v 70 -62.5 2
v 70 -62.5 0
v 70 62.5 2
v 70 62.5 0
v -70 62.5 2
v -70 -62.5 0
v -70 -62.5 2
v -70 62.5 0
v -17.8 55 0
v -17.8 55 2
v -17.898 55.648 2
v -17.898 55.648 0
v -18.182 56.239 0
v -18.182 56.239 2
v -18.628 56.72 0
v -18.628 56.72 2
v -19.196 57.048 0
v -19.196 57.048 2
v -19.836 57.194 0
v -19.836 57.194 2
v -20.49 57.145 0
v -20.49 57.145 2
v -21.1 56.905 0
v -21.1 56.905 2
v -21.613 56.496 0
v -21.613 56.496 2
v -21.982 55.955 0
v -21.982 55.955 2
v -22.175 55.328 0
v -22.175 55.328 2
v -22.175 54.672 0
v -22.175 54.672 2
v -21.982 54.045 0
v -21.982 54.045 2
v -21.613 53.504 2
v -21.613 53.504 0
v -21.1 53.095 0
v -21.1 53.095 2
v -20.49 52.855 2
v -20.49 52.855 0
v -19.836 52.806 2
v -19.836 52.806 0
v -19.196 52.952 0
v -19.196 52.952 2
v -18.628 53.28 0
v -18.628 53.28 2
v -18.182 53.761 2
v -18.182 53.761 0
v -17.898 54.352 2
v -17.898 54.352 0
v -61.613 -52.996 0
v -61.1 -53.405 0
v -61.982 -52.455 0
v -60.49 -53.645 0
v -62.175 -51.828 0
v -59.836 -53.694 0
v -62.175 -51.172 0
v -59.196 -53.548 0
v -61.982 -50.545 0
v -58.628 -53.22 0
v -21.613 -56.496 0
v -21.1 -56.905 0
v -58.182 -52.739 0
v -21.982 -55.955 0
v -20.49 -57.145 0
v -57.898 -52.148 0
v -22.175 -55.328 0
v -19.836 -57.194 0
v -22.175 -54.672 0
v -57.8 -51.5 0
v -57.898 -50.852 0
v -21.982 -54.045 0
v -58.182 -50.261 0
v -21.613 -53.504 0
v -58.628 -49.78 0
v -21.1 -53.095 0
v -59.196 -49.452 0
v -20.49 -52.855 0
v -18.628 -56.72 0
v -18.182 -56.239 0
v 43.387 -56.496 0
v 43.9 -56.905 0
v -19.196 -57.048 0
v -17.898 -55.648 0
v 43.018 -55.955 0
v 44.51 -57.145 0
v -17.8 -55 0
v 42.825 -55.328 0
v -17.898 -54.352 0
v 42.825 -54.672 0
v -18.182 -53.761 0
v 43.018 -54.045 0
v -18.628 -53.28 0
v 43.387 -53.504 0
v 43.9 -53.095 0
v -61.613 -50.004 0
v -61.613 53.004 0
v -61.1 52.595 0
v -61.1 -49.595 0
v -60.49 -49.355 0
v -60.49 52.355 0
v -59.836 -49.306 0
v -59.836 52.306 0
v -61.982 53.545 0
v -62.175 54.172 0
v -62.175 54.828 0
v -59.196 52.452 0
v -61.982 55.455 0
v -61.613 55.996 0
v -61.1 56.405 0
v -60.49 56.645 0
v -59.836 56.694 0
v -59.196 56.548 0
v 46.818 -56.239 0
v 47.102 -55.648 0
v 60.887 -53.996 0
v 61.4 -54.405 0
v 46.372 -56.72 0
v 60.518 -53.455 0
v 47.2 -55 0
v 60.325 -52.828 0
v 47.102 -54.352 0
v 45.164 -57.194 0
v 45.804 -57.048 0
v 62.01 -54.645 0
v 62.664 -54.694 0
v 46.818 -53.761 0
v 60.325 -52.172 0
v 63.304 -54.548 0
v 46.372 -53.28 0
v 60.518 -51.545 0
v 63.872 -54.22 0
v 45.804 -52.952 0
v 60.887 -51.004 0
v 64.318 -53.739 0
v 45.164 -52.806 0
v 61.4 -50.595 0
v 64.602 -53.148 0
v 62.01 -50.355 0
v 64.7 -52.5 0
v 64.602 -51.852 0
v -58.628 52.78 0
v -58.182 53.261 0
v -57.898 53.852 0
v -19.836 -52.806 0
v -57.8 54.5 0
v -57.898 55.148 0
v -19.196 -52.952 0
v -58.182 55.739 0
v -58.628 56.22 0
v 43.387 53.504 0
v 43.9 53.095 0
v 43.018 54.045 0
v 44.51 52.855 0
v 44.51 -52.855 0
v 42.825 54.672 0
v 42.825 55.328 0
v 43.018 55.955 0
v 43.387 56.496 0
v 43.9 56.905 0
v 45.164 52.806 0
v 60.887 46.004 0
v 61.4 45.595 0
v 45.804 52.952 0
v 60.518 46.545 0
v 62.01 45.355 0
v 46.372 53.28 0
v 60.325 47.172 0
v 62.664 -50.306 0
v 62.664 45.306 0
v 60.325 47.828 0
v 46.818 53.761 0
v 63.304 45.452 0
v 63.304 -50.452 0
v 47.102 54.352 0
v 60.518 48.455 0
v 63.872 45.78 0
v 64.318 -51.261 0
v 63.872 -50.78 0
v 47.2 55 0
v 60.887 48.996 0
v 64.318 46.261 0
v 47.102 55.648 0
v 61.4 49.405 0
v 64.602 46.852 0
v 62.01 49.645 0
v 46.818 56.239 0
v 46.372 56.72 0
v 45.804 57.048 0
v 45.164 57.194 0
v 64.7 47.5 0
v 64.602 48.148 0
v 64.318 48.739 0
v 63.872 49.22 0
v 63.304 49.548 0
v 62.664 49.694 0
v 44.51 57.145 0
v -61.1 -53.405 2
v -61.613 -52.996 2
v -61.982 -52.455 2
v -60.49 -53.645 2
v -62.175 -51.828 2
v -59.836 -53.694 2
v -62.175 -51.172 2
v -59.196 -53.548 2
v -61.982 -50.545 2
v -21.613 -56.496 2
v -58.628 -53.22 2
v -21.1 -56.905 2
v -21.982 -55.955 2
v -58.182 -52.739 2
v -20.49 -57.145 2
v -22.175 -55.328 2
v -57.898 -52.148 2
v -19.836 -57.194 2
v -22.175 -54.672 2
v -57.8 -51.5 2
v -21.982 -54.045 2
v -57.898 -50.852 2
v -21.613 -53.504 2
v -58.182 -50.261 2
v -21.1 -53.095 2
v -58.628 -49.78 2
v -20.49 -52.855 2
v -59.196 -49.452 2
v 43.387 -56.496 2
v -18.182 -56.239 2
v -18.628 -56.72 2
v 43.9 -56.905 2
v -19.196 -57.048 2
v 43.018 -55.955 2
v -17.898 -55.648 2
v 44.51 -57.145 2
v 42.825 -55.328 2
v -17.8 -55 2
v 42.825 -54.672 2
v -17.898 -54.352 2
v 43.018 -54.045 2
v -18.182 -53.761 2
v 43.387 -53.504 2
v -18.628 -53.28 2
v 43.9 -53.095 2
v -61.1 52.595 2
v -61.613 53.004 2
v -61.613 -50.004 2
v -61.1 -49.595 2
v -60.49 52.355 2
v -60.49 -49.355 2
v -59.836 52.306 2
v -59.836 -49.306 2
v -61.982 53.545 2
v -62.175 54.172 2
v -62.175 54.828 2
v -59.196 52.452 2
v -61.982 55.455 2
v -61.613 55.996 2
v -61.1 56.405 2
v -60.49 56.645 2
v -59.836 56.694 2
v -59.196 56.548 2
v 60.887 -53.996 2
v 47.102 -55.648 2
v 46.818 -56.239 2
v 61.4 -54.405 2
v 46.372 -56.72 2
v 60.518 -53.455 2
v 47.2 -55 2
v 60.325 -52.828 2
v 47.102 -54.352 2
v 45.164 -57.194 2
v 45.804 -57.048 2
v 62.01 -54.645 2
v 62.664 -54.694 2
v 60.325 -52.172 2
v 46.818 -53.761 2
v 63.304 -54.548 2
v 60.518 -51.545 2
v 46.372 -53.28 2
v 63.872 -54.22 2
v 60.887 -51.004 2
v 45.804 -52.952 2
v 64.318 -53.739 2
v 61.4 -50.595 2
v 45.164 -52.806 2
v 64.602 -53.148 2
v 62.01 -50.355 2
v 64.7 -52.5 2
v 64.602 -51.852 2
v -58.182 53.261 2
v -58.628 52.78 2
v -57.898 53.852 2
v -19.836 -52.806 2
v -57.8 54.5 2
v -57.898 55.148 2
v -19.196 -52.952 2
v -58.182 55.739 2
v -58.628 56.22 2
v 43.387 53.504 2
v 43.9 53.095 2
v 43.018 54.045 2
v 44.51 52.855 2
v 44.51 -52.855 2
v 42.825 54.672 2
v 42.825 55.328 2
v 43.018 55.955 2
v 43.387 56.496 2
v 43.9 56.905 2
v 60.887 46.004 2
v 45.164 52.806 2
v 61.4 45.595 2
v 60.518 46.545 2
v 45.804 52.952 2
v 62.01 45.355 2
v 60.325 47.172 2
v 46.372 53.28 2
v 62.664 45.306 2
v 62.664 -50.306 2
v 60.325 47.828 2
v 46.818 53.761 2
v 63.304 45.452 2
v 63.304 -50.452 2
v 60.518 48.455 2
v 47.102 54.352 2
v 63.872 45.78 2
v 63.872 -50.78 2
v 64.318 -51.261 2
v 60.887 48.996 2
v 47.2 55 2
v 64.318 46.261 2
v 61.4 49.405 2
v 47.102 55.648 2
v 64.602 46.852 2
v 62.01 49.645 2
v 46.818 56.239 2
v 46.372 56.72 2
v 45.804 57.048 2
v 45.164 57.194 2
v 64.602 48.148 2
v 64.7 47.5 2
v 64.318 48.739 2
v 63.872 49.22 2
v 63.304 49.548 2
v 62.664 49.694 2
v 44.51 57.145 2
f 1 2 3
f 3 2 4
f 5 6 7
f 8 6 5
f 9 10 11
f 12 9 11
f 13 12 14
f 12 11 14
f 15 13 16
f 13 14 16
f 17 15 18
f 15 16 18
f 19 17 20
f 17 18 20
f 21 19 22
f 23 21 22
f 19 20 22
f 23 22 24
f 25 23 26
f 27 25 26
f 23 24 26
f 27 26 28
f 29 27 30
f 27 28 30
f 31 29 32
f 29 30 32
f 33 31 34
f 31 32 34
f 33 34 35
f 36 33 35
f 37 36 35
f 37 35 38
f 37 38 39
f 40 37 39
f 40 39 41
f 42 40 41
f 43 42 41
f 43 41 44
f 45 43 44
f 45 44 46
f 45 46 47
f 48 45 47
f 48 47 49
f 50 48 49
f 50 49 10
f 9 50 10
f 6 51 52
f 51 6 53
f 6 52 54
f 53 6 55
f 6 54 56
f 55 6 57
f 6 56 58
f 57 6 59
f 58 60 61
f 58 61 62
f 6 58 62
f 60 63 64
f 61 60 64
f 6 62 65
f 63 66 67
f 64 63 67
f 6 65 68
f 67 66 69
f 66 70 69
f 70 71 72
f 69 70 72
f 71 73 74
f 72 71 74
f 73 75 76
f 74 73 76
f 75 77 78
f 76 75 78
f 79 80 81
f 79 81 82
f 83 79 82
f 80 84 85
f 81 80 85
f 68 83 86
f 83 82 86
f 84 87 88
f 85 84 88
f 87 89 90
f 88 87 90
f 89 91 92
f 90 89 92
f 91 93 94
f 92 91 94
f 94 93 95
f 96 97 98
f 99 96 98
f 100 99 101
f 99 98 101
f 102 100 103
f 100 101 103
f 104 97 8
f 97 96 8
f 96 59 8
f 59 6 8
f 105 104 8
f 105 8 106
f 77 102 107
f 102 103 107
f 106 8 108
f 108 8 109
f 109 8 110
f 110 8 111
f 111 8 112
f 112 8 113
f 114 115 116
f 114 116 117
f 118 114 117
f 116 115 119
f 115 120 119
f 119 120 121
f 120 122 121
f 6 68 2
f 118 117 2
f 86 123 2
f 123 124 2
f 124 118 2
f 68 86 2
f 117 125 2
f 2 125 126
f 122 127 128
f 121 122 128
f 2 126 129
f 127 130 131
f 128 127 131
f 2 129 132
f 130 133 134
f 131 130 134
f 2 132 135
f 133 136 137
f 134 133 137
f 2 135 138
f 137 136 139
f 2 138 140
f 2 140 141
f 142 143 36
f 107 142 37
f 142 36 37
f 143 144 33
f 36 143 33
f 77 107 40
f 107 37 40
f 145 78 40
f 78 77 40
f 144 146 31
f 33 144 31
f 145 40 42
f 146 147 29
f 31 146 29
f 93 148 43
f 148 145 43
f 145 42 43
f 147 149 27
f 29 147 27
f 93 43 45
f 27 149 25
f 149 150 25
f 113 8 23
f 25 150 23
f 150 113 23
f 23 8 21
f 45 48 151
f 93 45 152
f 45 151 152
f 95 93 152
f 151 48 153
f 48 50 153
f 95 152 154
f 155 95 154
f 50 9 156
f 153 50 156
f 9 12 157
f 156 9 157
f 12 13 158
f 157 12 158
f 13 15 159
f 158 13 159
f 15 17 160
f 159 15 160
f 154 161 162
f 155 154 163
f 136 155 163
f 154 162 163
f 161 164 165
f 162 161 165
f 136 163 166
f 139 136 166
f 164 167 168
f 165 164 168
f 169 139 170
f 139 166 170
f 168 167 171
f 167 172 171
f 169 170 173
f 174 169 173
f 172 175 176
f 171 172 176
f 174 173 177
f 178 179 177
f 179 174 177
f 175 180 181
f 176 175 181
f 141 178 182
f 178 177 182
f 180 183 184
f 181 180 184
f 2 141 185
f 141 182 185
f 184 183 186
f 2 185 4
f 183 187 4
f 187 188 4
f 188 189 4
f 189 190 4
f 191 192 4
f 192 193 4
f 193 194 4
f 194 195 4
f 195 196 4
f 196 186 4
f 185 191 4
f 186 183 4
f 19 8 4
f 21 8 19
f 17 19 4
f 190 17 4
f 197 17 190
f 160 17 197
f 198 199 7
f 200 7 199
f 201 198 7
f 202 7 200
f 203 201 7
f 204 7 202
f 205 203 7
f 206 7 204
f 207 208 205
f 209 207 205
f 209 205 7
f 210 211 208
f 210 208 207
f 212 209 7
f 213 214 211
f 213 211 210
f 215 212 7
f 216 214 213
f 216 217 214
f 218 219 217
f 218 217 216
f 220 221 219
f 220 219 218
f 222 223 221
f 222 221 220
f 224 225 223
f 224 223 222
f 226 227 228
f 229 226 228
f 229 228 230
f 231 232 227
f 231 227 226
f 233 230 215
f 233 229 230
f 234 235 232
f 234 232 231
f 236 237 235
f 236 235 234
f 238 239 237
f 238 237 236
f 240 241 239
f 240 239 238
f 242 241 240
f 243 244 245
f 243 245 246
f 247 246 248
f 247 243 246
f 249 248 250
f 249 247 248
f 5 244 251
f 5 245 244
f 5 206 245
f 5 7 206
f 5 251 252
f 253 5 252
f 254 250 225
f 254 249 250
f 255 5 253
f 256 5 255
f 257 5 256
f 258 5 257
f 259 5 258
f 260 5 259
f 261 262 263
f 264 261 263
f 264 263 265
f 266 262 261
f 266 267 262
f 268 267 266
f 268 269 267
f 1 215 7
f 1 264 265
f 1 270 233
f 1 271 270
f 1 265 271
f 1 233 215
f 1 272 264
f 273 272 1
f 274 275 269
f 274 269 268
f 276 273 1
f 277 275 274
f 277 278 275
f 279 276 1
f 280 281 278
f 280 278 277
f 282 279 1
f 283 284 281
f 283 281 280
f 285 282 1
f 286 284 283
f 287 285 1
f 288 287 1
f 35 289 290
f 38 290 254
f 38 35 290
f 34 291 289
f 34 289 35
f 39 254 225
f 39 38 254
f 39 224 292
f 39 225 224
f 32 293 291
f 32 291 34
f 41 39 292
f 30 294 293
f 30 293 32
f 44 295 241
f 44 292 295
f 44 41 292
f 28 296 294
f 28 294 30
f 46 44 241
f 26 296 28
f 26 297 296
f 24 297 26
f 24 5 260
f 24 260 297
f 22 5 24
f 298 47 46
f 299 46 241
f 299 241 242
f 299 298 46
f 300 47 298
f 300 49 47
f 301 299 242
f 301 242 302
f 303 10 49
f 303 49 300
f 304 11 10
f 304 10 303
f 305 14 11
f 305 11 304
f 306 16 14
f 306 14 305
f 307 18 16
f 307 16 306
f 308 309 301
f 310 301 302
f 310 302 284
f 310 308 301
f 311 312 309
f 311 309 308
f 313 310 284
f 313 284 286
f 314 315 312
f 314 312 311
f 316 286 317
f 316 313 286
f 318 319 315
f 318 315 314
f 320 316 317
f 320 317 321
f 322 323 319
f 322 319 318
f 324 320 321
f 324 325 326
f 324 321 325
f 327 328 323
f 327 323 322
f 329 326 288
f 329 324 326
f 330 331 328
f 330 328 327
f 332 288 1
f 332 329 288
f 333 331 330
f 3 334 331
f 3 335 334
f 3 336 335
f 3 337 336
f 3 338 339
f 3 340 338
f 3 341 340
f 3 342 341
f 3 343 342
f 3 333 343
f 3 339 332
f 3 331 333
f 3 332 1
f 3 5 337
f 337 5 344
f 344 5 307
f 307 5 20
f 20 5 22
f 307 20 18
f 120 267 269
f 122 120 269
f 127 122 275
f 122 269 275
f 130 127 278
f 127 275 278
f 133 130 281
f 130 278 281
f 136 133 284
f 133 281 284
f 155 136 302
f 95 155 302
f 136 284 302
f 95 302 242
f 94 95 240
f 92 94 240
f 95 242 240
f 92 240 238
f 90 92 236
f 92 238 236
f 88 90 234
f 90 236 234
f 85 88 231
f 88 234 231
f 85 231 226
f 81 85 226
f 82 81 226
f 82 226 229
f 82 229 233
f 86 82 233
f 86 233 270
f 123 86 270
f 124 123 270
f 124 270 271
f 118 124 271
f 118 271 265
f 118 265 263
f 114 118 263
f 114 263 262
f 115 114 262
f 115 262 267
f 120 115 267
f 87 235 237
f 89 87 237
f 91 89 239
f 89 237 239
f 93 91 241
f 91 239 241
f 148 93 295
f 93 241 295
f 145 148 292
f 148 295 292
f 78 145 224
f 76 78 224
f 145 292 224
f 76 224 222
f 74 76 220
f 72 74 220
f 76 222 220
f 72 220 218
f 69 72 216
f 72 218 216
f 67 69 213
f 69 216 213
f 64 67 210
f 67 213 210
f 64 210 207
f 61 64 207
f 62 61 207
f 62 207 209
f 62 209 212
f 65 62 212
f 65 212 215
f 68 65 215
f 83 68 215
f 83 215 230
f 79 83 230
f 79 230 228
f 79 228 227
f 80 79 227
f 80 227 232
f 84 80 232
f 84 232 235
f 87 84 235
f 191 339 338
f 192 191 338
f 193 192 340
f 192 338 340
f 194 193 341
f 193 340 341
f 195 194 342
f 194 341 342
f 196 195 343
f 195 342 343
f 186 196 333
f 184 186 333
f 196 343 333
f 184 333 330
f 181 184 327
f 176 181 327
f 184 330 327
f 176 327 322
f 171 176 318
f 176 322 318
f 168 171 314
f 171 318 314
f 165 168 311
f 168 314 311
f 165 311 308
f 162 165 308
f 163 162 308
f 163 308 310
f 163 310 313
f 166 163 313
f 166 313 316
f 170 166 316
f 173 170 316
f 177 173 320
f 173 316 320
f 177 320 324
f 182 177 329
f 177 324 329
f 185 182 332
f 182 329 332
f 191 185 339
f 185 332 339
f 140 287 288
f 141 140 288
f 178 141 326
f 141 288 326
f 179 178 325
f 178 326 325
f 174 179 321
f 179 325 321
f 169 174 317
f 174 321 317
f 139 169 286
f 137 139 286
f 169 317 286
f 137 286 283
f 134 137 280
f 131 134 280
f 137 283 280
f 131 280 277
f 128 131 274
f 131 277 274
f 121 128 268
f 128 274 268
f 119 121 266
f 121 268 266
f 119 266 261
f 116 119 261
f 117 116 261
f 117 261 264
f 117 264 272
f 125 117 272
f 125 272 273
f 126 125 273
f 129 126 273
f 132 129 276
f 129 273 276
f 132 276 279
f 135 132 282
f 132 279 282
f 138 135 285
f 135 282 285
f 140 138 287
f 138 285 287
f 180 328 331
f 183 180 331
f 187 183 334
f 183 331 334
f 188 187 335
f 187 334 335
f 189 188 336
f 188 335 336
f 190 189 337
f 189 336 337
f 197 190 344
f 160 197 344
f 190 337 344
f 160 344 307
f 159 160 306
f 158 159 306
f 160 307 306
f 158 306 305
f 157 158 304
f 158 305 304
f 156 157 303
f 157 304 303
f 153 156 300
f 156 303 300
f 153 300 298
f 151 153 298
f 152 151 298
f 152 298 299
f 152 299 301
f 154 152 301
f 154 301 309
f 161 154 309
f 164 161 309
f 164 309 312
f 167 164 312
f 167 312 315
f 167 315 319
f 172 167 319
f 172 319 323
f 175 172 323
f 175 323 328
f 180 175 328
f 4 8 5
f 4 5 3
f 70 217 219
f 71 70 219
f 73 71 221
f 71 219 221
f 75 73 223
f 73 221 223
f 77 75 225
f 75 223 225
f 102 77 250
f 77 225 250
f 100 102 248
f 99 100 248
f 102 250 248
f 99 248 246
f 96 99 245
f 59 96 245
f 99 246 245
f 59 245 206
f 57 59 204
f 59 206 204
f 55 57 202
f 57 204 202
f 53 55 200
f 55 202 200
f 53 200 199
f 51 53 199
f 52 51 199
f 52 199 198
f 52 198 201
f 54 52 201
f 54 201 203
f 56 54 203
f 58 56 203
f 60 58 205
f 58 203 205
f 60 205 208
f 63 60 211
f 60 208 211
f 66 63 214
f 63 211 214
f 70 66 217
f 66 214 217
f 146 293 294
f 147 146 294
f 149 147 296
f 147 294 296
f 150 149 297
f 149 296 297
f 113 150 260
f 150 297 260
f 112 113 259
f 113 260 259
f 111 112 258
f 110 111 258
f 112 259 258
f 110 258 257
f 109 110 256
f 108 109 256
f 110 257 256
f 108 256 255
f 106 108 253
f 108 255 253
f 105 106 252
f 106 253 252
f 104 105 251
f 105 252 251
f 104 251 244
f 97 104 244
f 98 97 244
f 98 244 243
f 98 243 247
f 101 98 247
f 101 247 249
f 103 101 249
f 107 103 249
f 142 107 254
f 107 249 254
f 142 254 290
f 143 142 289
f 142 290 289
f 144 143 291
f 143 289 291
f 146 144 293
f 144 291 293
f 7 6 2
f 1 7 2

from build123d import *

# Parameters (mm, degrees)
SKETCH_1_W          = 140
SKETCH_1_H          = 125
EXTRUDE_1_DEPTH     = 2
SKETCH_3_R          = 2.2
CUT_EXTRUDE_1_DEPTH = 2
SKETCH_6_R          = 2.2
CUT_EXTRUDE_2_DEPTH = 2
SKETCH_7_R          = 2.2
CUT_EXTRUDE_3_DEPTH = 105


with BuildPart() as part:
    # ｽｹｯﾁ1 → ﾎﾞｽ - 押し出し1 (new body)
    with BuildSketch(Plane.XY):
        Rectangle(SKETCH_1_W, SKETCH_1_H)
    extrude(amount=EXTRUDE_1_DEPTH)

    # ｽｹｯﾁ3 → ｶｯﾄ - 押し出し1 (cut)
    with BuildSketch(Plane.XY.offset(2)):
        with Locations((-60, 54.5)):
            Circle(SKETCH_3_R)
        with Locations((-60, -51.5)):
            Circle(SKETCH_3_R)
    extrude(amount=-CUT_EXTRUDE_1_DEPTH, mode=Mode.SUBTRACT)

    # ｽｹｯﾁ6 → ｶｯﾄ - 押し出し2 (cut)
    with BuildSketch(Plane.XY.offset(2)):
        with Locations((62.5, -52.5)):
            Circle(SKETCH_6_R)
        with Locations((62.5, 47.5)):
            Circle(SKETCH_6_R)
    extrude(amount=-CUT_EXTRUDE_2_DEPTH, mode=Mode.SUBTRACT)

    # ｽｹｯﾁ7 → ｶｯﾄ - 押し出し3 (cut)
    with BuildSketch(Plane.XY.offset(2)):
        with BuildLine():
            ThreePointArc((42.8, 55), (45, 52.8), (47.2, 55))
            Line((47.2, 55), (45, 55))
            Line((45, 55), (42.8, 55))
        make_face()
        with BuildLine():
            Line((45, 55), (47.2, 55))
            ThreePointArc((47.2, 55), (45, 57.2), (42.8, 55))
            Line((42.8, 55), (45, 55))
        make_face()
        with Locations((-20, 55)):
            Circle(SKETCH_7_R)
        with Locations((-20, -55)):
            Circle(SKETCH_7_R)
        with Locations((45, -55)):
            Circle(SKETCH_7_R)
    extrude(amount=-CUT_EXTRUDE_3_DEPTH, mode=Mode.SUBTRACT)


solid = part.part
